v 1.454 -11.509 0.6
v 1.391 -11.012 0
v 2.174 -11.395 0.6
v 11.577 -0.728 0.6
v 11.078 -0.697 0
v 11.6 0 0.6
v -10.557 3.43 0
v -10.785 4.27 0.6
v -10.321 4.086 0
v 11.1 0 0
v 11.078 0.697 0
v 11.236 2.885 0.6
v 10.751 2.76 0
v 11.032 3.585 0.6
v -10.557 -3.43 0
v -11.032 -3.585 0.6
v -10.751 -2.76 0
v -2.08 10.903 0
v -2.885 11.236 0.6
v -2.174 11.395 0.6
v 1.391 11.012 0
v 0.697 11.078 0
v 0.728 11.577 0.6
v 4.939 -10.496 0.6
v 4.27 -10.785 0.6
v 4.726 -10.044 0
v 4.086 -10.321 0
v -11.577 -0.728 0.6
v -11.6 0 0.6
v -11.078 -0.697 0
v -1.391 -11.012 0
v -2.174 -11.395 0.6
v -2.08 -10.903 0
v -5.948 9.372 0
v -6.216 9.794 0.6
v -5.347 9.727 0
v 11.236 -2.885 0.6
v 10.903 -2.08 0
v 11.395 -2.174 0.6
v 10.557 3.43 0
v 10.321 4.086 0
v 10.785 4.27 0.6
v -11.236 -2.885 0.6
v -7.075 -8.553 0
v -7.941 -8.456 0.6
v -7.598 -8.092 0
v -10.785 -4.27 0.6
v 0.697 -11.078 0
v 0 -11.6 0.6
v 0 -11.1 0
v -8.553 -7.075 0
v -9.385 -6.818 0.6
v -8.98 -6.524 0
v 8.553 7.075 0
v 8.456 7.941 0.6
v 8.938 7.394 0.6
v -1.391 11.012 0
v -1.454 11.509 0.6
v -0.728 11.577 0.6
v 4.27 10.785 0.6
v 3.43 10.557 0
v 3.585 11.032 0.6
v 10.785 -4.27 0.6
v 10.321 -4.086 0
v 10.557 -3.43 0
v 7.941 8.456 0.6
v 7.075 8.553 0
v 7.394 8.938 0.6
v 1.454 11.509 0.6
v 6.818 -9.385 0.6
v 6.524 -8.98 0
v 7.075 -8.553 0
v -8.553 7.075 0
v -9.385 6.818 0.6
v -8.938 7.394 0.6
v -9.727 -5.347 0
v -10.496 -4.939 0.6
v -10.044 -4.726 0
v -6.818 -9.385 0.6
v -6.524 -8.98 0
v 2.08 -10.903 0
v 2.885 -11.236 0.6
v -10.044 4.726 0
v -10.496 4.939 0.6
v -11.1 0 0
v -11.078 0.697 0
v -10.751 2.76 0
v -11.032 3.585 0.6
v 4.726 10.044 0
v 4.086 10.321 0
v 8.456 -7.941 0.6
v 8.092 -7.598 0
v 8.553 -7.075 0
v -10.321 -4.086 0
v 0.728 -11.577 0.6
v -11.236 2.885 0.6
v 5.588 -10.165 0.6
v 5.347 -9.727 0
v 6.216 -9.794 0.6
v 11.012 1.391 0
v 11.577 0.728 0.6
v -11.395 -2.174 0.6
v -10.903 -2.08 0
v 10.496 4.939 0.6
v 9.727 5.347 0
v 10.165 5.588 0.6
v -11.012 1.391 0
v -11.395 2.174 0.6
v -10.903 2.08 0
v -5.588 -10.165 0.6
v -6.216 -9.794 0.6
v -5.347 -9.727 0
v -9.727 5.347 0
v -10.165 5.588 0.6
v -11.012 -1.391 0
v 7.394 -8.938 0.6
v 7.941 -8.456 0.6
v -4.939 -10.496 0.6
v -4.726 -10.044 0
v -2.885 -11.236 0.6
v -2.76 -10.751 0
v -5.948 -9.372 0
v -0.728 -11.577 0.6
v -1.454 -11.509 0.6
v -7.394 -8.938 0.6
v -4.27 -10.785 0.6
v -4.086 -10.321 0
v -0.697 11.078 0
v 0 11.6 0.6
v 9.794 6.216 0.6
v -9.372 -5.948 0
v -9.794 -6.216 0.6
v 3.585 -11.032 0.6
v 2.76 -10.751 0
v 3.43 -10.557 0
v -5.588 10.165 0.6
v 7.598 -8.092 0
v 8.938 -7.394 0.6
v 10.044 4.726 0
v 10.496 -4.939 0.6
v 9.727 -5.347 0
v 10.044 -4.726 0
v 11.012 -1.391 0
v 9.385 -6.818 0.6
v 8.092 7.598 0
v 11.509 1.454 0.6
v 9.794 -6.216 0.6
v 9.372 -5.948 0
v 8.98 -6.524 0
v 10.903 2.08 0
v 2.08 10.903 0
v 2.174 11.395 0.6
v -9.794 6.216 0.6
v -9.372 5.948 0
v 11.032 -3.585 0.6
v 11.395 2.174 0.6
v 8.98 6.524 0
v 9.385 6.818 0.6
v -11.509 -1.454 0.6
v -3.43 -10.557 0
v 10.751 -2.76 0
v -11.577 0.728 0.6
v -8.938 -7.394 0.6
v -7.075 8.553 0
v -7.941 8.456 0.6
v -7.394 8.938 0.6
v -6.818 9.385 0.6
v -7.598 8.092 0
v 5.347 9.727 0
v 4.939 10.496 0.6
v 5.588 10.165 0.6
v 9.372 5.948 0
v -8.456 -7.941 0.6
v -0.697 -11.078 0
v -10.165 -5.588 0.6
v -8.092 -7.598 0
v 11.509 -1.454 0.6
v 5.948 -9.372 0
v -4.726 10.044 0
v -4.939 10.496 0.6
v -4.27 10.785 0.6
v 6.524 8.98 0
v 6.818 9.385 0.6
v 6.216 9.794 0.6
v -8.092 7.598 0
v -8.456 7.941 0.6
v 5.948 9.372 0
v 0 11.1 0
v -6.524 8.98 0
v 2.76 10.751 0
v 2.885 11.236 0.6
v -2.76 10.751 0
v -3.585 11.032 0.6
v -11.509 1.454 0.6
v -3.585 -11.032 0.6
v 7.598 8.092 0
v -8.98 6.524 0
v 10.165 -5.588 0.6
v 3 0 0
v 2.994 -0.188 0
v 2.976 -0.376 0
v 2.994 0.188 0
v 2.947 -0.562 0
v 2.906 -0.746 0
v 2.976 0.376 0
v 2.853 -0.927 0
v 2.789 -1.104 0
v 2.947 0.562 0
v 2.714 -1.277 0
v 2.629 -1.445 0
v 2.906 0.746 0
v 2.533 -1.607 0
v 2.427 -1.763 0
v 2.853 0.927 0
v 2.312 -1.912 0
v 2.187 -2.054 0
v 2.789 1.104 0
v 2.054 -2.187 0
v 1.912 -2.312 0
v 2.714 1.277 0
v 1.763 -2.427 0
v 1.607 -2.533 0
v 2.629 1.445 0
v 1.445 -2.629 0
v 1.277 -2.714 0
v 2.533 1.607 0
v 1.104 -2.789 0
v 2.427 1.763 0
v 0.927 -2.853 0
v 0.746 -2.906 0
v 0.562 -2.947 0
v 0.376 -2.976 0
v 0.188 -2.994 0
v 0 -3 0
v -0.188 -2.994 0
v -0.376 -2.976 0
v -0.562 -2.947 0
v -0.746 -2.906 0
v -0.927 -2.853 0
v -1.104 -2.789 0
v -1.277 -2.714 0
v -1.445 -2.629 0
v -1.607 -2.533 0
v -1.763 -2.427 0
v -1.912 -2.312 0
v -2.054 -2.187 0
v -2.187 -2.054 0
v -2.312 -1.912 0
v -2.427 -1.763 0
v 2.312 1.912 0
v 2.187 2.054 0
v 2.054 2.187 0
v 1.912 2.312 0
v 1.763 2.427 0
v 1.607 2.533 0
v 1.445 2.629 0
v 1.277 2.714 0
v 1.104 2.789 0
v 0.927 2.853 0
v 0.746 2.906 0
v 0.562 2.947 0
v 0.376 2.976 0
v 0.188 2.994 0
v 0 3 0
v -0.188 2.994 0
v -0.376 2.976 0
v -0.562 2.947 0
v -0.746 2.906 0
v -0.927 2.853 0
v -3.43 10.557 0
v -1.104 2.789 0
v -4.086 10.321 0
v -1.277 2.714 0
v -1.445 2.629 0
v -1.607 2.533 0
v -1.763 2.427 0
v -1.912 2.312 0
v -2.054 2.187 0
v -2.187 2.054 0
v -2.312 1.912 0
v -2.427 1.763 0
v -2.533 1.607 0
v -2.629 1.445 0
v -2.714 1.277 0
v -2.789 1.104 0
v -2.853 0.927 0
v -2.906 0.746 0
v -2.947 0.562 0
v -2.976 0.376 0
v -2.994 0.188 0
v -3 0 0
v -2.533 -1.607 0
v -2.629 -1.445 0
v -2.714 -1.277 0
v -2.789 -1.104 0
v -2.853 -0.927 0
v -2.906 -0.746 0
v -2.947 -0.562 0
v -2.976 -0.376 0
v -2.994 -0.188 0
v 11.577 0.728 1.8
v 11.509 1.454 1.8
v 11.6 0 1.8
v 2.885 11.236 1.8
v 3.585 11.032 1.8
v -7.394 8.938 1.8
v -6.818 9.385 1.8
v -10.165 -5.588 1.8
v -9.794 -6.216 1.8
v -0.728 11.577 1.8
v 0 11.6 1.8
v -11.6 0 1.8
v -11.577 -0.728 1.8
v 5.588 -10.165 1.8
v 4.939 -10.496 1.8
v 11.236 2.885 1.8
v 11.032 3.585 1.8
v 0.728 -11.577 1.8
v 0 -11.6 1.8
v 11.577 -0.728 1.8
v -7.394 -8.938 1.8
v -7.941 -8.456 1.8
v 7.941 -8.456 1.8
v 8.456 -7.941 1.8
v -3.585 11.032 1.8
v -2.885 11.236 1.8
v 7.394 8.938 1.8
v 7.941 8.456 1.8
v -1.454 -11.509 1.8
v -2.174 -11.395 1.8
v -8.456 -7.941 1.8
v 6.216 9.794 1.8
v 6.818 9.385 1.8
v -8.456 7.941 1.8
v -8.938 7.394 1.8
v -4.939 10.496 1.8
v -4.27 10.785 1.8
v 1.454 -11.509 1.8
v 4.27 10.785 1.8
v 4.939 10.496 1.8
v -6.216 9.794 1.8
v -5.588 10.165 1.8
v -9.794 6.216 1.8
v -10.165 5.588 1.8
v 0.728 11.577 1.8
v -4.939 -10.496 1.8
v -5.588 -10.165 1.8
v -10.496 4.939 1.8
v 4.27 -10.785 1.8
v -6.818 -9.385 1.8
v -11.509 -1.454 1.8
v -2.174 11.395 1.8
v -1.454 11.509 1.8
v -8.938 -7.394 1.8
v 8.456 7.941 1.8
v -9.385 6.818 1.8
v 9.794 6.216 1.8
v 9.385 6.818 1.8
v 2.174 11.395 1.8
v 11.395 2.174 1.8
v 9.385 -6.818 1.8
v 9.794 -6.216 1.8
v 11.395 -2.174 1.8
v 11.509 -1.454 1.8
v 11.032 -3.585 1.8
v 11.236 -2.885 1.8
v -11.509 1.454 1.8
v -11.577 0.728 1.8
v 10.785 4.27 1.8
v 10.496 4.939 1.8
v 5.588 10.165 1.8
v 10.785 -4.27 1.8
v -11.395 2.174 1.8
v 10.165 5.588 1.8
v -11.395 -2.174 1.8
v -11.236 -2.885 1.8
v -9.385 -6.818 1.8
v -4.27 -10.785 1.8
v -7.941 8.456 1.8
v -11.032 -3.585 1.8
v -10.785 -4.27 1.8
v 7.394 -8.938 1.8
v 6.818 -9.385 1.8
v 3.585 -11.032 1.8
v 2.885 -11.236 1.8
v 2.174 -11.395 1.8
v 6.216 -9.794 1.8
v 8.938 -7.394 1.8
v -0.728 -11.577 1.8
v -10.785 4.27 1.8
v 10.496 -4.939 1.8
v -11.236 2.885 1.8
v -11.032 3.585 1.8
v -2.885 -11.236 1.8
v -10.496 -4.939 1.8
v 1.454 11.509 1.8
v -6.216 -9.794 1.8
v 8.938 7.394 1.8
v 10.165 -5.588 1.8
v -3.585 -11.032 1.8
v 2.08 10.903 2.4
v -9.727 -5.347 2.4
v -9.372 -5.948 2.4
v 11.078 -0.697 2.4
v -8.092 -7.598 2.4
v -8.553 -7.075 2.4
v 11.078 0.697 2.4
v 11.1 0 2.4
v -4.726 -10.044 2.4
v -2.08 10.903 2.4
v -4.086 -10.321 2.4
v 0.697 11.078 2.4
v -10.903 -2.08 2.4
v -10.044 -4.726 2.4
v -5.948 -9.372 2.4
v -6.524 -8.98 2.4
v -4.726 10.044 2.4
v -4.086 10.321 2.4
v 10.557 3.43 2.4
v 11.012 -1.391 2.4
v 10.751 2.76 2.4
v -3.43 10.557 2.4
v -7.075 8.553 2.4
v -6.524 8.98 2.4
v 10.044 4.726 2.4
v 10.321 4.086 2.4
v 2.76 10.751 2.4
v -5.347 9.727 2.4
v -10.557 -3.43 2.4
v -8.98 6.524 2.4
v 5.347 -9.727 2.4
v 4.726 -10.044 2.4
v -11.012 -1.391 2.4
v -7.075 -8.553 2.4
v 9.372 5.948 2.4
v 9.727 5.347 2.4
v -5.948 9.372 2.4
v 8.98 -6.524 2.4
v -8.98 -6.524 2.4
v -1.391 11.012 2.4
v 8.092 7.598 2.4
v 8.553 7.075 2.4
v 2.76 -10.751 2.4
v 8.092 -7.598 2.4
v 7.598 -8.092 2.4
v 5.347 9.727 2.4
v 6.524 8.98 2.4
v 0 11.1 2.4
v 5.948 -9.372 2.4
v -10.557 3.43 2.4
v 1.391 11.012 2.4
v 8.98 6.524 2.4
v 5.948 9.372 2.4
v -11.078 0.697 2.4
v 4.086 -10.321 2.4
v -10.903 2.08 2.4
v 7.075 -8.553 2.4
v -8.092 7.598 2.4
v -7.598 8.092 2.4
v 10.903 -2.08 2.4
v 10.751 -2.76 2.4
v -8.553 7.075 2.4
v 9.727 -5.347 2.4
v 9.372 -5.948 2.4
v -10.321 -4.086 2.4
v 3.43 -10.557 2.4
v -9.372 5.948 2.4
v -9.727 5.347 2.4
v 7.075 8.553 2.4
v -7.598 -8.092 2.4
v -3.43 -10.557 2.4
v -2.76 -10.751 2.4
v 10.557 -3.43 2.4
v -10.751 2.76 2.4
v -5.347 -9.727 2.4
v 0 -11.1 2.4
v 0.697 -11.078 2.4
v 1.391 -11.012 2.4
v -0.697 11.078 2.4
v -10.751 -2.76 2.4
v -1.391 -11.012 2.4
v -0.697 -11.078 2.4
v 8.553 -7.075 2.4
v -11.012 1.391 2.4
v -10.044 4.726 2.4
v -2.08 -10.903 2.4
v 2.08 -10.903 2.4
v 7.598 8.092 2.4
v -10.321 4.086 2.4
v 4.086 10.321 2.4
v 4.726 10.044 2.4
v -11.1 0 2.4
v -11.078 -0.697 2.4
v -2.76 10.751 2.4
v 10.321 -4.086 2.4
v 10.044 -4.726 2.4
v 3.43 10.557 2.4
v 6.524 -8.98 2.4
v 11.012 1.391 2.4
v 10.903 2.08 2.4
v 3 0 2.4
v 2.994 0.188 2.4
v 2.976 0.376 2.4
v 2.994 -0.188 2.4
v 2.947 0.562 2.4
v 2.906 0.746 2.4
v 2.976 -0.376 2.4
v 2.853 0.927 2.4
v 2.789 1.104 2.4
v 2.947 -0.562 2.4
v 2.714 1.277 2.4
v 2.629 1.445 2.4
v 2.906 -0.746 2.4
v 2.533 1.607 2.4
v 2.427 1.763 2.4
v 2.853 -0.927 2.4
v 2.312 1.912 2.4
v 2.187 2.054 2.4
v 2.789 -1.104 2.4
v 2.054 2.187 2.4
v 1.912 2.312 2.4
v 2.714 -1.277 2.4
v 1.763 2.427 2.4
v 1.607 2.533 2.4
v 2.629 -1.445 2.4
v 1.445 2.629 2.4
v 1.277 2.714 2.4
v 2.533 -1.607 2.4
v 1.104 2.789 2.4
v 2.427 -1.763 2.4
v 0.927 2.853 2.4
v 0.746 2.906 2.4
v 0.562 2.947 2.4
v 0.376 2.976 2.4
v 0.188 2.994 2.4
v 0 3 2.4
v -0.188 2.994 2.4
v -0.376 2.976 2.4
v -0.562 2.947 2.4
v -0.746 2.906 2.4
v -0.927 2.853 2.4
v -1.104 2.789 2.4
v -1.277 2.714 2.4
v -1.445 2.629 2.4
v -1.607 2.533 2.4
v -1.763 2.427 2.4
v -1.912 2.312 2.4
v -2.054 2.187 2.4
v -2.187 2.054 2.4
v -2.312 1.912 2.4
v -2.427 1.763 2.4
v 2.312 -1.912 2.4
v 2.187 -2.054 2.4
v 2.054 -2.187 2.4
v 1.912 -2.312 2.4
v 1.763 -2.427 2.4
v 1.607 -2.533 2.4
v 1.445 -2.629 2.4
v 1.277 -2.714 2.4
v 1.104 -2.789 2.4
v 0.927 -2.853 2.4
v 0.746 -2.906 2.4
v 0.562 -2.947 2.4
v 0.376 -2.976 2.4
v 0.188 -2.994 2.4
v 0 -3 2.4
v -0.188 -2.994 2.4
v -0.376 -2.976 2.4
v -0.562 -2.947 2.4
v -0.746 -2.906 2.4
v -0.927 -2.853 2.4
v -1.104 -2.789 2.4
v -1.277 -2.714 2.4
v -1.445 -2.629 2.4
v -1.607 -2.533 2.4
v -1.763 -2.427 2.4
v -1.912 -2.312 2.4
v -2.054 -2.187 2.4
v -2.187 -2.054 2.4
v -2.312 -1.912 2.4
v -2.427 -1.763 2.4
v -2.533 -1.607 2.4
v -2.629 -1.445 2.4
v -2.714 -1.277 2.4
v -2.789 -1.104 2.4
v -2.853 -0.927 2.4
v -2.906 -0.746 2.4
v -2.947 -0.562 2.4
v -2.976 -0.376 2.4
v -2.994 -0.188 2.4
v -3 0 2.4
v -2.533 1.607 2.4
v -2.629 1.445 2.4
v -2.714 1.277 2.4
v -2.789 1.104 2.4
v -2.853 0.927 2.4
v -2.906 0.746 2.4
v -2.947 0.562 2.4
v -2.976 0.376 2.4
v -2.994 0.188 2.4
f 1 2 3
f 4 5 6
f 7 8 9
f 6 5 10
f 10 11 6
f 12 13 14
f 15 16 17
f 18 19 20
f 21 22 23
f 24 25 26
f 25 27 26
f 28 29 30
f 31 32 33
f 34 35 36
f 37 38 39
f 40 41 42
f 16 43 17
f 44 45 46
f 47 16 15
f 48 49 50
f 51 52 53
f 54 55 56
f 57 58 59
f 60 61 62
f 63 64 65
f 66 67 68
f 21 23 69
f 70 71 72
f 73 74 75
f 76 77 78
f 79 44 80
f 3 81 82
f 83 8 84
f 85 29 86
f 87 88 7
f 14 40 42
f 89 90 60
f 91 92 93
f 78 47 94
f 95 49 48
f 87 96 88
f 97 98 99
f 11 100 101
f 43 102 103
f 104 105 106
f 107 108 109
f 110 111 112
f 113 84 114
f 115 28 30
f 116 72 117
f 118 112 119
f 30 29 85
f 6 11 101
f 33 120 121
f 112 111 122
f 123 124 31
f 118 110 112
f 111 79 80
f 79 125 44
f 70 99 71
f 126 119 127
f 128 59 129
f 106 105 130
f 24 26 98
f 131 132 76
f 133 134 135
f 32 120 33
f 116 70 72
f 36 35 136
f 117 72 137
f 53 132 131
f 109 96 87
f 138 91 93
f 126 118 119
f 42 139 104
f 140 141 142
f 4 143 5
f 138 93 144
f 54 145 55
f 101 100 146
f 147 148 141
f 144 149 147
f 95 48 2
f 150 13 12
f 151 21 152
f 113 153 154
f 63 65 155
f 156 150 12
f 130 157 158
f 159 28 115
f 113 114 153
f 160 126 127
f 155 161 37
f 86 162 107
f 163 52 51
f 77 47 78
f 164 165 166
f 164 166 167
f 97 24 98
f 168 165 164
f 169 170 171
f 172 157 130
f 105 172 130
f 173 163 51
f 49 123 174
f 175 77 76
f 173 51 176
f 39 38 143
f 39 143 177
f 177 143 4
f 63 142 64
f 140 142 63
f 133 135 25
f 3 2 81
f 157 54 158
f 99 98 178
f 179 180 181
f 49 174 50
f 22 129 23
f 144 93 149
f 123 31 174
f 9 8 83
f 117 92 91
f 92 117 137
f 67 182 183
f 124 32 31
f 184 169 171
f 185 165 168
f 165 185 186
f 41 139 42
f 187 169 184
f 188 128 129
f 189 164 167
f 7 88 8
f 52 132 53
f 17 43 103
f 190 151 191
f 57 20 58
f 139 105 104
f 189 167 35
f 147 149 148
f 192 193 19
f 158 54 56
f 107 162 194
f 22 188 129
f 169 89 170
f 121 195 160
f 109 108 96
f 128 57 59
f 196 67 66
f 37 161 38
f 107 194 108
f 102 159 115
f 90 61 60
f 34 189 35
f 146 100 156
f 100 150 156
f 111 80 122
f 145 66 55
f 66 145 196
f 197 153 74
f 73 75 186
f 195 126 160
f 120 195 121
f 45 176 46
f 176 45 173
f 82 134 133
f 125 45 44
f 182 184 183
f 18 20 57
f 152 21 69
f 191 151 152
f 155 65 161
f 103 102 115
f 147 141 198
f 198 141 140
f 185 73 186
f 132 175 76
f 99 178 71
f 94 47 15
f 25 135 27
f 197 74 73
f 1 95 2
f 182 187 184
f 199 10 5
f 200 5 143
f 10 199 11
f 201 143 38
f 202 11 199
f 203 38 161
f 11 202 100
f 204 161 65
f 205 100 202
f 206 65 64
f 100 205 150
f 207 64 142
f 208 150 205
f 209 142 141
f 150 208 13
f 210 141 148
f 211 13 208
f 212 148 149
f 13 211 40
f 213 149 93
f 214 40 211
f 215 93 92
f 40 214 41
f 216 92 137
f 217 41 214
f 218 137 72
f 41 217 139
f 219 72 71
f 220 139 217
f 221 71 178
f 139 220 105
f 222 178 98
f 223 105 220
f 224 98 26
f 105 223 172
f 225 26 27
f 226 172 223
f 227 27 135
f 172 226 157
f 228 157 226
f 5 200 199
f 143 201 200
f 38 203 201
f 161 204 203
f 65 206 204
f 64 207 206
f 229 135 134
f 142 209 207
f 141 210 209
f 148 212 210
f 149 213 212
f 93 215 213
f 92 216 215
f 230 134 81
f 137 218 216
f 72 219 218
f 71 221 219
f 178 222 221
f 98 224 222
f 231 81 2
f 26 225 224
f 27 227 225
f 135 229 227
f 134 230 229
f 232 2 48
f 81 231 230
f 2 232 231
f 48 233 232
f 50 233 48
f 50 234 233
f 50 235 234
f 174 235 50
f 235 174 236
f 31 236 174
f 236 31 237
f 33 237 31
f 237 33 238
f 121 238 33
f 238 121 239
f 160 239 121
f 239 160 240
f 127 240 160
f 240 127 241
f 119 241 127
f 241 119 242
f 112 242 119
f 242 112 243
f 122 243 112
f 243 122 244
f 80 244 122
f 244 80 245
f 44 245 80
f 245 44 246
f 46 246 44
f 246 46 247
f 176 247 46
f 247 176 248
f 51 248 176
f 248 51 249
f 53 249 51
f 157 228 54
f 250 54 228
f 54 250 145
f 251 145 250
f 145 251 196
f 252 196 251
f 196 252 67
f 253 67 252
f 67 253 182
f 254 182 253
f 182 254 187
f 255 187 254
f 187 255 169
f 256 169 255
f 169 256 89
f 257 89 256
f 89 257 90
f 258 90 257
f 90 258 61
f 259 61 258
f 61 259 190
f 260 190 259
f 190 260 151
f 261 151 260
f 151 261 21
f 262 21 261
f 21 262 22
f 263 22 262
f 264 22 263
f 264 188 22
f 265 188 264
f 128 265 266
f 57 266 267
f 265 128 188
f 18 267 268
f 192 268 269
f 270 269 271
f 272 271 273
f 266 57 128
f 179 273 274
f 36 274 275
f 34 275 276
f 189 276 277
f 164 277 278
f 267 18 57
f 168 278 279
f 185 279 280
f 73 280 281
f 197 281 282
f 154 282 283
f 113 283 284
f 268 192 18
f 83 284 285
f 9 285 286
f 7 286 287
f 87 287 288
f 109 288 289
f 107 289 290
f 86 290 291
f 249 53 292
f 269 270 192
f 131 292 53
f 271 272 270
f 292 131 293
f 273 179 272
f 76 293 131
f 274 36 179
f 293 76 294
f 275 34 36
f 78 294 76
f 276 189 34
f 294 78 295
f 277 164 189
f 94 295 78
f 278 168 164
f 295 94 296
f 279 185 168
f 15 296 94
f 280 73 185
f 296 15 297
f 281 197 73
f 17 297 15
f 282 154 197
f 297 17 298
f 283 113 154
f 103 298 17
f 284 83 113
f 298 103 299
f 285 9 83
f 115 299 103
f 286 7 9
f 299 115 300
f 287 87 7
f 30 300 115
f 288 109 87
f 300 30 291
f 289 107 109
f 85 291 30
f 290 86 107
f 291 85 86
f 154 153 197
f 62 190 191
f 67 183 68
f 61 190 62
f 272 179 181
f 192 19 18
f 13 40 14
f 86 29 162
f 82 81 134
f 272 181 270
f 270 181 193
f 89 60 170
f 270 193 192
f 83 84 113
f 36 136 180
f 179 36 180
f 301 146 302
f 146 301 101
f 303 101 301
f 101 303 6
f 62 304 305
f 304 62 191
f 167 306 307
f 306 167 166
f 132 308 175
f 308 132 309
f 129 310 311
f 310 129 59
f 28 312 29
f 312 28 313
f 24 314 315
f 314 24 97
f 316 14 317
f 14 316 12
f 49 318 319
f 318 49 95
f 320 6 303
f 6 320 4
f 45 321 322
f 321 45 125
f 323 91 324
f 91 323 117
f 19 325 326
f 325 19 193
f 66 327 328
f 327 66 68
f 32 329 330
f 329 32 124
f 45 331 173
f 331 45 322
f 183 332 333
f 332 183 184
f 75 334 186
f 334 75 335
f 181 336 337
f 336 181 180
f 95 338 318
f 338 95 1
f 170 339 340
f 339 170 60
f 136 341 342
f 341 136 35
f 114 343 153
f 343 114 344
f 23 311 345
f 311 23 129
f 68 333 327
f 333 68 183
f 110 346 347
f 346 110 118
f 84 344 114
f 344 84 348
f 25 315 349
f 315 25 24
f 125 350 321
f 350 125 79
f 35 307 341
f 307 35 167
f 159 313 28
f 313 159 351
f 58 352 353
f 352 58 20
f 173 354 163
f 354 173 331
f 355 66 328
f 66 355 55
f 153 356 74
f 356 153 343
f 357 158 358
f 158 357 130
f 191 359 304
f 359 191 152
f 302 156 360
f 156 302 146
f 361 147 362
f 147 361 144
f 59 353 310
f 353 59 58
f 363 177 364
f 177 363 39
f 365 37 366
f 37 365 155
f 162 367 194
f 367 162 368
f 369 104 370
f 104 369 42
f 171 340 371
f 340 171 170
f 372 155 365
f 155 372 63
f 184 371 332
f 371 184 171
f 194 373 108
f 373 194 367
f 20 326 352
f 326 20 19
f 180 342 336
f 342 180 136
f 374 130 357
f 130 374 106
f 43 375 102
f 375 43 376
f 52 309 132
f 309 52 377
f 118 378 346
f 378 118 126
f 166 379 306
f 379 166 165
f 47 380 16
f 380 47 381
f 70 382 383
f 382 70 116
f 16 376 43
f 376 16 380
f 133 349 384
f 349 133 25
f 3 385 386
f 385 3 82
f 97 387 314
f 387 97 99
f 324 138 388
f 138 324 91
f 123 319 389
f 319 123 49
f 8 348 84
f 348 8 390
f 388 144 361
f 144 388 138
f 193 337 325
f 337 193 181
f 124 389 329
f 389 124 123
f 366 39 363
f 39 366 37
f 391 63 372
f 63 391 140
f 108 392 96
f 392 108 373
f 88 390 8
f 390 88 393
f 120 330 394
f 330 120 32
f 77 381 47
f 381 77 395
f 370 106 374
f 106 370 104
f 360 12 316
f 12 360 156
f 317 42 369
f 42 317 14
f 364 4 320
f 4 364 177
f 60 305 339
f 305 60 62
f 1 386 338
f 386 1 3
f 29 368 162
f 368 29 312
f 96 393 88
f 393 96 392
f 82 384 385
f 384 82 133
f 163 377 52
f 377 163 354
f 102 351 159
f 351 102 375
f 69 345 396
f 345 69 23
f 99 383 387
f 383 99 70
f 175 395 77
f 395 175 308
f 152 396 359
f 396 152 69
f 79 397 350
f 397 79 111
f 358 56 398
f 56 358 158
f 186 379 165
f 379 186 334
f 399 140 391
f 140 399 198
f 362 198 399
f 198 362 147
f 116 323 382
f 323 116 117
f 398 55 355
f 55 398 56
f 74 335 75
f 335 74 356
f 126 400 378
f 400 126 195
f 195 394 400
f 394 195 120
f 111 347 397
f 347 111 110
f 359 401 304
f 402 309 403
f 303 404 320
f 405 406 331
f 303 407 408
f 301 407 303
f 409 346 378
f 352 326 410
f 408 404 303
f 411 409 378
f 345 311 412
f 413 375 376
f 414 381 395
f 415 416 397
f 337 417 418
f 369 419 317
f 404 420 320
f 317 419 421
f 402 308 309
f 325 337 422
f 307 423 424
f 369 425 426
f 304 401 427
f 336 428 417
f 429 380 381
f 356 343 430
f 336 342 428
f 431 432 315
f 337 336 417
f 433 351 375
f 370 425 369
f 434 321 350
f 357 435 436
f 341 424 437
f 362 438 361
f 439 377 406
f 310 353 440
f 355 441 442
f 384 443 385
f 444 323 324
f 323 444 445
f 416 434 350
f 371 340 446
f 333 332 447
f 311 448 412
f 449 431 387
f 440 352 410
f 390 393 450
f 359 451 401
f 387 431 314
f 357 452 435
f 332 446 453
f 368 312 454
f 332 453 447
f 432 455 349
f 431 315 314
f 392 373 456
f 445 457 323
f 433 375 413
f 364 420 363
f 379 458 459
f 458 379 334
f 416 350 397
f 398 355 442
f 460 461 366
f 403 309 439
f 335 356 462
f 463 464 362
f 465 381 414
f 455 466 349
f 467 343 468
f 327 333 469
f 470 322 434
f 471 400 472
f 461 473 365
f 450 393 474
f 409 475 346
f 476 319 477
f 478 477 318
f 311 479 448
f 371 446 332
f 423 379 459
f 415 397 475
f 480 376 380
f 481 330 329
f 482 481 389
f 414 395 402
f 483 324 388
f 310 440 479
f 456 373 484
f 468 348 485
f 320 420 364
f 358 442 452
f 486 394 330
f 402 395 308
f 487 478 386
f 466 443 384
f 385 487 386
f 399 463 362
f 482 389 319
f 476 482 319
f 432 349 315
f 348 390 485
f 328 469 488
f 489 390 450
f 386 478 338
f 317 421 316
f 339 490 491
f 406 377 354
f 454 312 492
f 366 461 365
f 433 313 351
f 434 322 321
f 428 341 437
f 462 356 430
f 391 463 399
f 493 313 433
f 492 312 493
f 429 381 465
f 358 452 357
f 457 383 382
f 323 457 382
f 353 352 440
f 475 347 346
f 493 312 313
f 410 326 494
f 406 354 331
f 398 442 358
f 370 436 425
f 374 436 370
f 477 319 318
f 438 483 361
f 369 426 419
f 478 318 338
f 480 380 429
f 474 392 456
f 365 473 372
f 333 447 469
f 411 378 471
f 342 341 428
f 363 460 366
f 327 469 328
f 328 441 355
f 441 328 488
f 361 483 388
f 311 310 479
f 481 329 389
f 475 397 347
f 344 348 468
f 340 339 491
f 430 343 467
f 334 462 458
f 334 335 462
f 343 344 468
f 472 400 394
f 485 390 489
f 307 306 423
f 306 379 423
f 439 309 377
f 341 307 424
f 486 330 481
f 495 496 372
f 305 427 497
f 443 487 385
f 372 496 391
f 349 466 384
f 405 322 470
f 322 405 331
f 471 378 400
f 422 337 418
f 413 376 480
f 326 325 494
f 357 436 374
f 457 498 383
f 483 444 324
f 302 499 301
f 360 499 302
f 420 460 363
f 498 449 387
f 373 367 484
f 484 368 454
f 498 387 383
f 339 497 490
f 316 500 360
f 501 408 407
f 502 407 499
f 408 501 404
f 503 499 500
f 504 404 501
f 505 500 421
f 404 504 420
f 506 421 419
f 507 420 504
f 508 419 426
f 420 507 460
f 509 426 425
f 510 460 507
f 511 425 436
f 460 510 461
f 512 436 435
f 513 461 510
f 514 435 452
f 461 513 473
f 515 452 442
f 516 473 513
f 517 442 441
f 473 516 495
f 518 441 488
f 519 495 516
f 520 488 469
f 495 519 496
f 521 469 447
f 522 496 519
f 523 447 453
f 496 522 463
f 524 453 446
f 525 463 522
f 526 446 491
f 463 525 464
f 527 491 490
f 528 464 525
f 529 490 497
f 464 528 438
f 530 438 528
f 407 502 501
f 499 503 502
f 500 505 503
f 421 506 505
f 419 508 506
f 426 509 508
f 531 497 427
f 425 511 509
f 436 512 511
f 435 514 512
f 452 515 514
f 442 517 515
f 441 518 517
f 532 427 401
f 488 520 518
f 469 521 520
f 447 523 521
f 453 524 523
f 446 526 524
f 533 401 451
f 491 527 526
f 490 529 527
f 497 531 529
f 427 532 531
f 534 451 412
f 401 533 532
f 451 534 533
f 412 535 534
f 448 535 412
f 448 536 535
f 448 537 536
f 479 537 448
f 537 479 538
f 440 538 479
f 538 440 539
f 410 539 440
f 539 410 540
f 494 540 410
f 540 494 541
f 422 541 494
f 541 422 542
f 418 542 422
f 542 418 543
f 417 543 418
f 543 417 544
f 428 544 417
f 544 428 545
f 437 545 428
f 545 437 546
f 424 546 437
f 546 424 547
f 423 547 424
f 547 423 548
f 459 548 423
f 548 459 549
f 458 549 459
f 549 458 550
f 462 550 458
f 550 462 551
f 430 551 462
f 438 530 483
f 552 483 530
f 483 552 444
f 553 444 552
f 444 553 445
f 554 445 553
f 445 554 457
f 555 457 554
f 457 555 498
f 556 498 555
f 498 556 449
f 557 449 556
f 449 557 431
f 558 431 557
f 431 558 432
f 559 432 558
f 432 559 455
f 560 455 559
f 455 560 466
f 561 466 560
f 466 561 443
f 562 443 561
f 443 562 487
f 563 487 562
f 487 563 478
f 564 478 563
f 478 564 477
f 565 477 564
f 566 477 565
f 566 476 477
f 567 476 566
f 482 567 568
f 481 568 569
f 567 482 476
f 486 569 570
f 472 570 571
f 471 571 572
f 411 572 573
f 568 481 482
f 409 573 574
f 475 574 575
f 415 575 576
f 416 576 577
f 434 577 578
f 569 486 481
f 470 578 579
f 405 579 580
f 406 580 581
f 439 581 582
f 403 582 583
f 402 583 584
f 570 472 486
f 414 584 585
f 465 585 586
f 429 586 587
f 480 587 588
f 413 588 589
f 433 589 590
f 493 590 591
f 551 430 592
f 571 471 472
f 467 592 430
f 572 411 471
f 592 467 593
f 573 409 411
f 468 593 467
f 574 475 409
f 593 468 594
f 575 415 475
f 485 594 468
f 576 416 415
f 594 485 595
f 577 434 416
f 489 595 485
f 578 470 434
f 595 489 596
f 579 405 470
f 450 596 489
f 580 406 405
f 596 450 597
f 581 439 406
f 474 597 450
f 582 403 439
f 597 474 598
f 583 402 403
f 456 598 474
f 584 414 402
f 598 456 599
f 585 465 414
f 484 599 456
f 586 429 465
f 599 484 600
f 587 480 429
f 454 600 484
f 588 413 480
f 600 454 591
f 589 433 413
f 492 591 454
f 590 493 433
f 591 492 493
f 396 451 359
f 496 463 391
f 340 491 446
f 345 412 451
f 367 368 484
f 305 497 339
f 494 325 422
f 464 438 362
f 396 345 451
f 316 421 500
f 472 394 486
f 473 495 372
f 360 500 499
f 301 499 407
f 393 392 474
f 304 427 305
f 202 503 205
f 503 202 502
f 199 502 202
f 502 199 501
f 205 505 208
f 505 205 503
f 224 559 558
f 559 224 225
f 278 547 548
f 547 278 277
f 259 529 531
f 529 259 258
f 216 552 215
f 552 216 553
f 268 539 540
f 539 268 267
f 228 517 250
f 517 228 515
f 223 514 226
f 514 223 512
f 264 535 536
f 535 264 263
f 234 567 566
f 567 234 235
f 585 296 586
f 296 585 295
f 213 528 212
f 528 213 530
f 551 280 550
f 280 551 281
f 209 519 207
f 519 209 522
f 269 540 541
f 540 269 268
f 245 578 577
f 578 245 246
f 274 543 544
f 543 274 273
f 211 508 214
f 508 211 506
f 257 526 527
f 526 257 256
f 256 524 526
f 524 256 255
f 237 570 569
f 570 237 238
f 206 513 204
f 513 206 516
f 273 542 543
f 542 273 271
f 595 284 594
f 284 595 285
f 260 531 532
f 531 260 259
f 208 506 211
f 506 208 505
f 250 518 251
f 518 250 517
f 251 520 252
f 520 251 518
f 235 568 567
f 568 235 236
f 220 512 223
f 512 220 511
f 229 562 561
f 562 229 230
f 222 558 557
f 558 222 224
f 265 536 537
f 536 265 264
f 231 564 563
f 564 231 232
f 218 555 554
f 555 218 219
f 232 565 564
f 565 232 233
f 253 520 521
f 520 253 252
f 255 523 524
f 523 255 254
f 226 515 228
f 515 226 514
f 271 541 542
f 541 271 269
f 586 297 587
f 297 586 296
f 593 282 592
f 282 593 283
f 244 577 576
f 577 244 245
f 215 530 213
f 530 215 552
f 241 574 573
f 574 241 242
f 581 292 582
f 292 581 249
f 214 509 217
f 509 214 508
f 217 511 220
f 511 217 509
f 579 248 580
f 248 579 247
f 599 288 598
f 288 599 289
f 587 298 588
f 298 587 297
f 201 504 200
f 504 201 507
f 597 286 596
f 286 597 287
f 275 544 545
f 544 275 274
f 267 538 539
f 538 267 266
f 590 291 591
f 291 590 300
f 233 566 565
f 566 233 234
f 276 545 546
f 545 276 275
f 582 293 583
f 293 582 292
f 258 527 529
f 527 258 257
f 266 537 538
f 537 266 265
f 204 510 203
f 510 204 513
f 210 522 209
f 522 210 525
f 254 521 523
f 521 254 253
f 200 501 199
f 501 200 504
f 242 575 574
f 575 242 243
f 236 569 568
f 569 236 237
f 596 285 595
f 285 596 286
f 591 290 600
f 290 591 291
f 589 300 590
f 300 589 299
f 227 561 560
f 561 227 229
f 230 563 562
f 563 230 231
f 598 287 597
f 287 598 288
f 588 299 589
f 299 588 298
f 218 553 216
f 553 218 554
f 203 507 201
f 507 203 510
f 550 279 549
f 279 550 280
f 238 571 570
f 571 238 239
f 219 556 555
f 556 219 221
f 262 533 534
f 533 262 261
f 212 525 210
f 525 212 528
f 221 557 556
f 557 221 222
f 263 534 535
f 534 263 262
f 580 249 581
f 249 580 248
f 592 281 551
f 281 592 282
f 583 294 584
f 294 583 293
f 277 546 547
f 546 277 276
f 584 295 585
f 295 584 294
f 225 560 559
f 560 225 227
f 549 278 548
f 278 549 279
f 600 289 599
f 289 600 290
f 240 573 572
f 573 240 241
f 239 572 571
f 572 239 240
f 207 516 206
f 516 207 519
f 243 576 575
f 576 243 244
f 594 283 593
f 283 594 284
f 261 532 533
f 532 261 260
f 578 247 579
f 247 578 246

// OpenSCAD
$fn=100;
difference(){

//    cylinder(d=23.2,h=2.4);
    union(){
        linear_extrude(height=0.6, scale=[23.2/22.2, 23.2/22.2])
            circle(d=22.2);

        translate([0,0,0.6])
            cylinder(d=23.2,h=2.4-1.2);

        translate([0,0,2.4-0.6])
            linear_extrude(height=0.6, scale=[22.2/23.2, 22.2/23.2])
                circle(d=23.2);
    }
    cylinder(d=6,h=2.4);
}
